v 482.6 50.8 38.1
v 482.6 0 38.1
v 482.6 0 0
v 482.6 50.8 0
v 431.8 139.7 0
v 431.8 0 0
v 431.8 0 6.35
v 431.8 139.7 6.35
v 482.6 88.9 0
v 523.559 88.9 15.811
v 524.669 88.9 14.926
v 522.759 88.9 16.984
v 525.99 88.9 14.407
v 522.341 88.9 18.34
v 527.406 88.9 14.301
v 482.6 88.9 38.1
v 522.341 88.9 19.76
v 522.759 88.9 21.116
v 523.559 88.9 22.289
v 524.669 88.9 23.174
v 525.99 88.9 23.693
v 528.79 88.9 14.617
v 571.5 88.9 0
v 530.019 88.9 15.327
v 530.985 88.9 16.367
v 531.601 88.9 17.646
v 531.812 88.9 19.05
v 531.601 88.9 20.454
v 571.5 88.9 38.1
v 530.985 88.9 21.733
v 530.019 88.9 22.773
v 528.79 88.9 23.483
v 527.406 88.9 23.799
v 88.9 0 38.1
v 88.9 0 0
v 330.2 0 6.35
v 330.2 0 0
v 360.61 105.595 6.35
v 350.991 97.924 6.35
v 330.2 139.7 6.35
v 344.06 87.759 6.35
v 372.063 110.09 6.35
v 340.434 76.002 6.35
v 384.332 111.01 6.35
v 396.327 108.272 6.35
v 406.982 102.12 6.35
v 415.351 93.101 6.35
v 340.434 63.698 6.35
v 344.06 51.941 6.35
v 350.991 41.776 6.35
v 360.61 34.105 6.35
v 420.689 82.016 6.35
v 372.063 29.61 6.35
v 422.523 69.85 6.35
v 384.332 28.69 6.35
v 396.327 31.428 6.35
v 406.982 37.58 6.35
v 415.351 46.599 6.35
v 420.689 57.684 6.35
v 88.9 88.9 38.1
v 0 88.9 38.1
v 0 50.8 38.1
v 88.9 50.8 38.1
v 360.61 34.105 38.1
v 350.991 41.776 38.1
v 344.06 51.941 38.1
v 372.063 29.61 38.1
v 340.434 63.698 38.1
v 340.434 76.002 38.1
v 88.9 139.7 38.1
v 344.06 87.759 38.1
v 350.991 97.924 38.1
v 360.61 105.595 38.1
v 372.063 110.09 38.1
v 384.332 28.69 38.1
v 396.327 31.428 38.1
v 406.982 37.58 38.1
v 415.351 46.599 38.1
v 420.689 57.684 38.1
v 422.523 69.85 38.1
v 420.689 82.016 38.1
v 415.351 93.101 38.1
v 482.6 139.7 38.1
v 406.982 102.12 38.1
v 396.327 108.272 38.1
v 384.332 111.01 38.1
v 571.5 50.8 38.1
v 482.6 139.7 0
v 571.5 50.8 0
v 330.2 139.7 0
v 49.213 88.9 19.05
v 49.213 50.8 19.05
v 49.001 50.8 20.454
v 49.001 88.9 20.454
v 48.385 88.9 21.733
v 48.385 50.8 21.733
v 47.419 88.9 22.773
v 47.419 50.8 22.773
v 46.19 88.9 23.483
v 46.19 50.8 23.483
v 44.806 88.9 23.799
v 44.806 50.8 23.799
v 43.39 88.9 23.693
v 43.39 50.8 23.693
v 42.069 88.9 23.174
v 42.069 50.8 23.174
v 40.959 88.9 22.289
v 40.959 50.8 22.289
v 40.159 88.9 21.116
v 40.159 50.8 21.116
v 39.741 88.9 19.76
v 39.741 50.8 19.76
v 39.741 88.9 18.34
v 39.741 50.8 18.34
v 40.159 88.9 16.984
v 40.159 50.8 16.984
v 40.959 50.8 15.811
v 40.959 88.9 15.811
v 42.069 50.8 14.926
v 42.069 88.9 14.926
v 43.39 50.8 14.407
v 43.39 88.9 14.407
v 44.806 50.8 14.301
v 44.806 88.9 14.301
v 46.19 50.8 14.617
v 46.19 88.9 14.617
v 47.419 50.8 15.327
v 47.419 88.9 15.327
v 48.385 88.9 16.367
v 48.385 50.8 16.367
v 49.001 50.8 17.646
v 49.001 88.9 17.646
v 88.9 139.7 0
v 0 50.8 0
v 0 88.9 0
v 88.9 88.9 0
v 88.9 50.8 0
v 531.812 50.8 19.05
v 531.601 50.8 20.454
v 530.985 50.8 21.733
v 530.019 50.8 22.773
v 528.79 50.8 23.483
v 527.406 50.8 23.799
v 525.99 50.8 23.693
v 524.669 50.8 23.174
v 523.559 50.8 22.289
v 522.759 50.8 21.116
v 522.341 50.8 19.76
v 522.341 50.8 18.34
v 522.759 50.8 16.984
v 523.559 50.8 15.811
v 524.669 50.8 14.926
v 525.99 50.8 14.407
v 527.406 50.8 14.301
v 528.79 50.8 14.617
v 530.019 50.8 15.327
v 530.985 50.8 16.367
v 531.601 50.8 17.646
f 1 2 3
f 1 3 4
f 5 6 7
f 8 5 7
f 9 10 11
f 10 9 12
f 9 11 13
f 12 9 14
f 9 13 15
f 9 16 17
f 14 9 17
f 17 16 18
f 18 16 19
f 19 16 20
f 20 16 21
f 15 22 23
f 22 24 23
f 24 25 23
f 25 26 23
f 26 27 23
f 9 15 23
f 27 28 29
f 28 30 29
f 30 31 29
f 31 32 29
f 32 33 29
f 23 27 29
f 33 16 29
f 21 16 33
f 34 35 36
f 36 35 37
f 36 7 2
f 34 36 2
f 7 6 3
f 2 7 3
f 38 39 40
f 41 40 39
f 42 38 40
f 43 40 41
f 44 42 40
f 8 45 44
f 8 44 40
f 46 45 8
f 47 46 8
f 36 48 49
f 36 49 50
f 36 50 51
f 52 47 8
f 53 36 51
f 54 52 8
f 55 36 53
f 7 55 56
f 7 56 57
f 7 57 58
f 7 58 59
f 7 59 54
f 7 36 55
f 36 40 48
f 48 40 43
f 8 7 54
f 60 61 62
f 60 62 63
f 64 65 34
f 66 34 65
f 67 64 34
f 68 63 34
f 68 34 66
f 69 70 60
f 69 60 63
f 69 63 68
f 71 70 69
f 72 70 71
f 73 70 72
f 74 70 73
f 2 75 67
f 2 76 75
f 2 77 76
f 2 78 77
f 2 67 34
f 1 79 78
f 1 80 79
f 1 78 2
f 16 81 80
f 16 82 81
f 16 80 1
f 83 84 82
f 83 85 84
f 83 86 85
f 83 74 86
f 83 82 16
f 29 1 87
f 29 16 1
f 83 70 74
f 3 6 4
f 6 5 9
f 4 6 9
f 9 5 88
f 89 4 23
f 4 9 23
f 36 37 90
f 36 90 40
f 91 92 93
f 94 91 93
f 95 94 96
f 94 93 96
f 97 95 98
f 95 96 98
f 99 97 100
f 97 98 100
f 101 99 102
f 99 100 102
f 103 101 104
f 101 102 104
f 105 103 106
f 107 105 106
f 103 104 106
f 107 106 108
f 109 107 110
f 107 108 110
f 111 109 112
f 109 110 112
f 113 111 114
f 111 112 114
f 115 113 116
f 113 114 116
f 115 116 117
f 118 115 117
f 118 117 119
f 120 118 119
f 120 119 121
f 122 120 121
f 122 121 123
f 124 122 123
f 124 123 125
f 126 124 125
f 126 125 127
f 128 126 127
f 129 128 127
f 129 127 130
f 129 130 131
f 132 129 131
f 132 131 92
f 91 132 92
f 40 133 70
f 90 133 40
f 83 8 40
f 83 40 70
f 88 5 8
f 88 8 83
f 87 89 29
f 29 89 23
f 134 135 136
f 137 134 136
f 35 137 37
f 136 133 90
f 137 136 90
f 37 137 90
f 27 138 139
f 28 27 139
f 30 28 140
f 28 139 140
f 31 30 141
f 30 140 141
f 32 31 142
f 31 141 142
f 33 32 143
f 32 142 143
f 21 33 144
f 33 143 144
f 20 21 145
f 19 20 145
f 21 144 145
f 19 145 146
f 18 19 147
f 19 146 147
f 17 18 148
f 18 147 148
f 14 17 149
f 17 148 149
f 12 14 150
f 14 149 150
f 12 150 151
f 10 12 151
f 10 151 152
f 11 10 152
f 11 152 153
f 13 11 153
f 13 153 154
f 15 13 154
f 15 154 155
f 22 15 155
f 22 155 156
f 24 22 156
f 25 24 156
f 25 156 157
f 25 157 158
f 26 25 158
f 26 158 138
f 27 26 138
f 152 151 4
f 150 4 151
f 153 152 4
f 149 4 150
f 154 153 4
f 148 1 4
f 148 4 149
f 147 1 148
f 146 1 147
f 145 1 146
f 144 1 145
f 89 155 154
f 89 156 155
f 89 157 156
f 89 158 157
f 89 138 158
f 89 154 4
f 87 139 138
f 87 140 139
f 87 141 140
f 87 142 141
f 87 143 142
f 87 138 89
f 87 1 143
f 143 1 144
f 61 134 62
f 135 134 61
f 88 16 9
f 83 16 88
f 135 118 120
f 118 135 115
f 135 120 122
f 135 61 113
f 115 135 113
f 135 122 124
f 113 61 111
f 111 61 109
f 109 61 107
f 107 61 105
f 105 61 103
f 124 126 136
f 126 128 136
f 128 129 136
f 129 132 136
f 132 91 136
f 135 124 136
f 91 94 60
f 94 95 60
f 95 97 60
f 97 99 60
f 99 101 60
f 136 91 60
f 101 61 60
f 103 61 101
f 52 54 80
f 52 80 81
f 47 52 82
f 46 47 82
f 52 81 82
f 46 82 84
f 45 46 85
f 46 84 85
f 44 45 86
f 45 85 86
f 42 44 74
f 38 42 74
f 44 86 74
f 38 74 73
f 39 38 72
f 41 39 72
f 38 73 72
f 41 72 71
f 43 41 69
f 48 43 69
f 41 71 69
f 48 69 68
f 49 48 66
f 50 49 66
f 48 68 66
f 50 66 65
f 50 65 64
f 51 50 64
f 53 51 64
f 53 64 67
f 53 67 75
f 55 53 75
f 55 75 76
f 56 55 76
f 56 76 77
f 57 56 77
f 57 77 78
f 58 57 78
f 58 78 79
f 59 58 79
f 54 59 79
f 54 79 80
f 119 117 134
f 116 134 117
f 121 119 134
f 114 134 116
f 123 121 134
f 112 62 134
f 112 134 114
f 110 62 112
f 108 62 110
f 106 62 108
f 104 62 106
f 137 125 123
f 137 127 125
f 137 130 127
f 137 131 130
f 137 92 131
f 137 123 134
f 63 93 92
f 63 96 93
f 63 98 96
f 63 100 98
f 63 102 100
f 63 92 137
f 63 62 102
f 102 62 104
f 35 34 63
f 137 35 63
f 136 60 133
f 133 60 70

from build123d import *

# Parameters (mm, degrees)
SKETCH2_W           = 571.5
SKETCH2_H           = 139.7
BOSS_EXTRUDE2_DEPTH = 38.1
SKETCH3_W           = 88.9
SKETCH3_H           = 50.8
CUT_EXTRUDE1_DEPTH  = 590.559114933
SKETCH4_R           = 41.275
CUT_EXTRUDE2_DEPTH  = 590.559114933
SKETCH5_R           = 4.7625
CUT_EXTRUDE3_DEPTH  = 580.626664328
SKETCH6_R           = 4.7625
CUT_EXTRUDE4_DEPTH  = 580.626664328
SKETCH7_W           = 101.6
SKETCH7_H           = 6.35
CUT_EXTRUDE5_DEPTH  = 590.559114933


with BuildPart() as part:
    # Sketch2 → Boss-Extrude2 (new body)
    with BuildSketch(Plane.XY):
        with Locations((285.75, 69.85)):
            Rectangle(SKETCH2_W, SKETCH2_H)
    extrude(amount=BOSS_EXTRUDE2_DEPTH)

    # Sketch3 → Cut-Extrude1 (cut, through all)
    with BuildSketch(Plane.XY.offset(38.1)):
        with Locations((44.45, 114.3)):
            Rectangle(SKETCH3_W, SKETCH3_H)
        with Locations((527.05, 114.3)):
            Rectangle(SKETCH3_W, SKETCH3_H)
        with Locations((527.05, 25.4)):
            Rectangle(SKETCH3_W, SKETCH3_H)
        with Locations((44.45, 25.4)):
            Rectangle(SKETCH3_W, SKETCH3_H)
    extrude(amount=-CUT_EXTRUDE1_DEPTH, mode=Mode.SUBTRACT)

    # Sketch4 → Cut-Extrude2 (cut, through all)
    with BuildSketch(Plane.XY.offset(38.1)):
        with Locations((381.247583626, 69.85)):
            Circle(SKETCH4_R)
    extrude(amount=-CUT_EXTRUDE2_DEPTH, mode=Mode.SUBTRACT)

    # Sketch5 → Cut-Extrude3 (cut, through all)
    with BuildSketch(Plane(origin=(0, 50.8, 0), x_dir=(-1, 0, 0), z_dir=(0, -1, 0))):
        with Locations(Location((-44.45, -19.05, 0), (0, 0, 180))):
            Circle(SKETCH5_R)
    extrude(amount=-CUT_EXTRUDE3_DEPTH, mode=Mode.SUBTRACT)

    # Sketch6 → Cut-Extrude4 (cut, through all)
    with BuildSketch(Plane.XZ.offset(-50.8)):
        with Locations((527.05, 19.05)):
            Circle(SKETCH6_R)
    extrude(amount=-CUT_EXTRUDE4_DEPTH, mode=Mode.SUBTRACT)

    # Sketch7 → Cut-Extrude5 (cut, through all)
    with BuildSketch(Plane.XZ):
        with Locations((381, 3.175)):
            Rectangle(SKETCH7_W, SKETCH7_H)
    extrude(amount=-CUT_EXTRUDE5_DEPTH, mode=Mode.SUBTRACT)


solid = part.part
